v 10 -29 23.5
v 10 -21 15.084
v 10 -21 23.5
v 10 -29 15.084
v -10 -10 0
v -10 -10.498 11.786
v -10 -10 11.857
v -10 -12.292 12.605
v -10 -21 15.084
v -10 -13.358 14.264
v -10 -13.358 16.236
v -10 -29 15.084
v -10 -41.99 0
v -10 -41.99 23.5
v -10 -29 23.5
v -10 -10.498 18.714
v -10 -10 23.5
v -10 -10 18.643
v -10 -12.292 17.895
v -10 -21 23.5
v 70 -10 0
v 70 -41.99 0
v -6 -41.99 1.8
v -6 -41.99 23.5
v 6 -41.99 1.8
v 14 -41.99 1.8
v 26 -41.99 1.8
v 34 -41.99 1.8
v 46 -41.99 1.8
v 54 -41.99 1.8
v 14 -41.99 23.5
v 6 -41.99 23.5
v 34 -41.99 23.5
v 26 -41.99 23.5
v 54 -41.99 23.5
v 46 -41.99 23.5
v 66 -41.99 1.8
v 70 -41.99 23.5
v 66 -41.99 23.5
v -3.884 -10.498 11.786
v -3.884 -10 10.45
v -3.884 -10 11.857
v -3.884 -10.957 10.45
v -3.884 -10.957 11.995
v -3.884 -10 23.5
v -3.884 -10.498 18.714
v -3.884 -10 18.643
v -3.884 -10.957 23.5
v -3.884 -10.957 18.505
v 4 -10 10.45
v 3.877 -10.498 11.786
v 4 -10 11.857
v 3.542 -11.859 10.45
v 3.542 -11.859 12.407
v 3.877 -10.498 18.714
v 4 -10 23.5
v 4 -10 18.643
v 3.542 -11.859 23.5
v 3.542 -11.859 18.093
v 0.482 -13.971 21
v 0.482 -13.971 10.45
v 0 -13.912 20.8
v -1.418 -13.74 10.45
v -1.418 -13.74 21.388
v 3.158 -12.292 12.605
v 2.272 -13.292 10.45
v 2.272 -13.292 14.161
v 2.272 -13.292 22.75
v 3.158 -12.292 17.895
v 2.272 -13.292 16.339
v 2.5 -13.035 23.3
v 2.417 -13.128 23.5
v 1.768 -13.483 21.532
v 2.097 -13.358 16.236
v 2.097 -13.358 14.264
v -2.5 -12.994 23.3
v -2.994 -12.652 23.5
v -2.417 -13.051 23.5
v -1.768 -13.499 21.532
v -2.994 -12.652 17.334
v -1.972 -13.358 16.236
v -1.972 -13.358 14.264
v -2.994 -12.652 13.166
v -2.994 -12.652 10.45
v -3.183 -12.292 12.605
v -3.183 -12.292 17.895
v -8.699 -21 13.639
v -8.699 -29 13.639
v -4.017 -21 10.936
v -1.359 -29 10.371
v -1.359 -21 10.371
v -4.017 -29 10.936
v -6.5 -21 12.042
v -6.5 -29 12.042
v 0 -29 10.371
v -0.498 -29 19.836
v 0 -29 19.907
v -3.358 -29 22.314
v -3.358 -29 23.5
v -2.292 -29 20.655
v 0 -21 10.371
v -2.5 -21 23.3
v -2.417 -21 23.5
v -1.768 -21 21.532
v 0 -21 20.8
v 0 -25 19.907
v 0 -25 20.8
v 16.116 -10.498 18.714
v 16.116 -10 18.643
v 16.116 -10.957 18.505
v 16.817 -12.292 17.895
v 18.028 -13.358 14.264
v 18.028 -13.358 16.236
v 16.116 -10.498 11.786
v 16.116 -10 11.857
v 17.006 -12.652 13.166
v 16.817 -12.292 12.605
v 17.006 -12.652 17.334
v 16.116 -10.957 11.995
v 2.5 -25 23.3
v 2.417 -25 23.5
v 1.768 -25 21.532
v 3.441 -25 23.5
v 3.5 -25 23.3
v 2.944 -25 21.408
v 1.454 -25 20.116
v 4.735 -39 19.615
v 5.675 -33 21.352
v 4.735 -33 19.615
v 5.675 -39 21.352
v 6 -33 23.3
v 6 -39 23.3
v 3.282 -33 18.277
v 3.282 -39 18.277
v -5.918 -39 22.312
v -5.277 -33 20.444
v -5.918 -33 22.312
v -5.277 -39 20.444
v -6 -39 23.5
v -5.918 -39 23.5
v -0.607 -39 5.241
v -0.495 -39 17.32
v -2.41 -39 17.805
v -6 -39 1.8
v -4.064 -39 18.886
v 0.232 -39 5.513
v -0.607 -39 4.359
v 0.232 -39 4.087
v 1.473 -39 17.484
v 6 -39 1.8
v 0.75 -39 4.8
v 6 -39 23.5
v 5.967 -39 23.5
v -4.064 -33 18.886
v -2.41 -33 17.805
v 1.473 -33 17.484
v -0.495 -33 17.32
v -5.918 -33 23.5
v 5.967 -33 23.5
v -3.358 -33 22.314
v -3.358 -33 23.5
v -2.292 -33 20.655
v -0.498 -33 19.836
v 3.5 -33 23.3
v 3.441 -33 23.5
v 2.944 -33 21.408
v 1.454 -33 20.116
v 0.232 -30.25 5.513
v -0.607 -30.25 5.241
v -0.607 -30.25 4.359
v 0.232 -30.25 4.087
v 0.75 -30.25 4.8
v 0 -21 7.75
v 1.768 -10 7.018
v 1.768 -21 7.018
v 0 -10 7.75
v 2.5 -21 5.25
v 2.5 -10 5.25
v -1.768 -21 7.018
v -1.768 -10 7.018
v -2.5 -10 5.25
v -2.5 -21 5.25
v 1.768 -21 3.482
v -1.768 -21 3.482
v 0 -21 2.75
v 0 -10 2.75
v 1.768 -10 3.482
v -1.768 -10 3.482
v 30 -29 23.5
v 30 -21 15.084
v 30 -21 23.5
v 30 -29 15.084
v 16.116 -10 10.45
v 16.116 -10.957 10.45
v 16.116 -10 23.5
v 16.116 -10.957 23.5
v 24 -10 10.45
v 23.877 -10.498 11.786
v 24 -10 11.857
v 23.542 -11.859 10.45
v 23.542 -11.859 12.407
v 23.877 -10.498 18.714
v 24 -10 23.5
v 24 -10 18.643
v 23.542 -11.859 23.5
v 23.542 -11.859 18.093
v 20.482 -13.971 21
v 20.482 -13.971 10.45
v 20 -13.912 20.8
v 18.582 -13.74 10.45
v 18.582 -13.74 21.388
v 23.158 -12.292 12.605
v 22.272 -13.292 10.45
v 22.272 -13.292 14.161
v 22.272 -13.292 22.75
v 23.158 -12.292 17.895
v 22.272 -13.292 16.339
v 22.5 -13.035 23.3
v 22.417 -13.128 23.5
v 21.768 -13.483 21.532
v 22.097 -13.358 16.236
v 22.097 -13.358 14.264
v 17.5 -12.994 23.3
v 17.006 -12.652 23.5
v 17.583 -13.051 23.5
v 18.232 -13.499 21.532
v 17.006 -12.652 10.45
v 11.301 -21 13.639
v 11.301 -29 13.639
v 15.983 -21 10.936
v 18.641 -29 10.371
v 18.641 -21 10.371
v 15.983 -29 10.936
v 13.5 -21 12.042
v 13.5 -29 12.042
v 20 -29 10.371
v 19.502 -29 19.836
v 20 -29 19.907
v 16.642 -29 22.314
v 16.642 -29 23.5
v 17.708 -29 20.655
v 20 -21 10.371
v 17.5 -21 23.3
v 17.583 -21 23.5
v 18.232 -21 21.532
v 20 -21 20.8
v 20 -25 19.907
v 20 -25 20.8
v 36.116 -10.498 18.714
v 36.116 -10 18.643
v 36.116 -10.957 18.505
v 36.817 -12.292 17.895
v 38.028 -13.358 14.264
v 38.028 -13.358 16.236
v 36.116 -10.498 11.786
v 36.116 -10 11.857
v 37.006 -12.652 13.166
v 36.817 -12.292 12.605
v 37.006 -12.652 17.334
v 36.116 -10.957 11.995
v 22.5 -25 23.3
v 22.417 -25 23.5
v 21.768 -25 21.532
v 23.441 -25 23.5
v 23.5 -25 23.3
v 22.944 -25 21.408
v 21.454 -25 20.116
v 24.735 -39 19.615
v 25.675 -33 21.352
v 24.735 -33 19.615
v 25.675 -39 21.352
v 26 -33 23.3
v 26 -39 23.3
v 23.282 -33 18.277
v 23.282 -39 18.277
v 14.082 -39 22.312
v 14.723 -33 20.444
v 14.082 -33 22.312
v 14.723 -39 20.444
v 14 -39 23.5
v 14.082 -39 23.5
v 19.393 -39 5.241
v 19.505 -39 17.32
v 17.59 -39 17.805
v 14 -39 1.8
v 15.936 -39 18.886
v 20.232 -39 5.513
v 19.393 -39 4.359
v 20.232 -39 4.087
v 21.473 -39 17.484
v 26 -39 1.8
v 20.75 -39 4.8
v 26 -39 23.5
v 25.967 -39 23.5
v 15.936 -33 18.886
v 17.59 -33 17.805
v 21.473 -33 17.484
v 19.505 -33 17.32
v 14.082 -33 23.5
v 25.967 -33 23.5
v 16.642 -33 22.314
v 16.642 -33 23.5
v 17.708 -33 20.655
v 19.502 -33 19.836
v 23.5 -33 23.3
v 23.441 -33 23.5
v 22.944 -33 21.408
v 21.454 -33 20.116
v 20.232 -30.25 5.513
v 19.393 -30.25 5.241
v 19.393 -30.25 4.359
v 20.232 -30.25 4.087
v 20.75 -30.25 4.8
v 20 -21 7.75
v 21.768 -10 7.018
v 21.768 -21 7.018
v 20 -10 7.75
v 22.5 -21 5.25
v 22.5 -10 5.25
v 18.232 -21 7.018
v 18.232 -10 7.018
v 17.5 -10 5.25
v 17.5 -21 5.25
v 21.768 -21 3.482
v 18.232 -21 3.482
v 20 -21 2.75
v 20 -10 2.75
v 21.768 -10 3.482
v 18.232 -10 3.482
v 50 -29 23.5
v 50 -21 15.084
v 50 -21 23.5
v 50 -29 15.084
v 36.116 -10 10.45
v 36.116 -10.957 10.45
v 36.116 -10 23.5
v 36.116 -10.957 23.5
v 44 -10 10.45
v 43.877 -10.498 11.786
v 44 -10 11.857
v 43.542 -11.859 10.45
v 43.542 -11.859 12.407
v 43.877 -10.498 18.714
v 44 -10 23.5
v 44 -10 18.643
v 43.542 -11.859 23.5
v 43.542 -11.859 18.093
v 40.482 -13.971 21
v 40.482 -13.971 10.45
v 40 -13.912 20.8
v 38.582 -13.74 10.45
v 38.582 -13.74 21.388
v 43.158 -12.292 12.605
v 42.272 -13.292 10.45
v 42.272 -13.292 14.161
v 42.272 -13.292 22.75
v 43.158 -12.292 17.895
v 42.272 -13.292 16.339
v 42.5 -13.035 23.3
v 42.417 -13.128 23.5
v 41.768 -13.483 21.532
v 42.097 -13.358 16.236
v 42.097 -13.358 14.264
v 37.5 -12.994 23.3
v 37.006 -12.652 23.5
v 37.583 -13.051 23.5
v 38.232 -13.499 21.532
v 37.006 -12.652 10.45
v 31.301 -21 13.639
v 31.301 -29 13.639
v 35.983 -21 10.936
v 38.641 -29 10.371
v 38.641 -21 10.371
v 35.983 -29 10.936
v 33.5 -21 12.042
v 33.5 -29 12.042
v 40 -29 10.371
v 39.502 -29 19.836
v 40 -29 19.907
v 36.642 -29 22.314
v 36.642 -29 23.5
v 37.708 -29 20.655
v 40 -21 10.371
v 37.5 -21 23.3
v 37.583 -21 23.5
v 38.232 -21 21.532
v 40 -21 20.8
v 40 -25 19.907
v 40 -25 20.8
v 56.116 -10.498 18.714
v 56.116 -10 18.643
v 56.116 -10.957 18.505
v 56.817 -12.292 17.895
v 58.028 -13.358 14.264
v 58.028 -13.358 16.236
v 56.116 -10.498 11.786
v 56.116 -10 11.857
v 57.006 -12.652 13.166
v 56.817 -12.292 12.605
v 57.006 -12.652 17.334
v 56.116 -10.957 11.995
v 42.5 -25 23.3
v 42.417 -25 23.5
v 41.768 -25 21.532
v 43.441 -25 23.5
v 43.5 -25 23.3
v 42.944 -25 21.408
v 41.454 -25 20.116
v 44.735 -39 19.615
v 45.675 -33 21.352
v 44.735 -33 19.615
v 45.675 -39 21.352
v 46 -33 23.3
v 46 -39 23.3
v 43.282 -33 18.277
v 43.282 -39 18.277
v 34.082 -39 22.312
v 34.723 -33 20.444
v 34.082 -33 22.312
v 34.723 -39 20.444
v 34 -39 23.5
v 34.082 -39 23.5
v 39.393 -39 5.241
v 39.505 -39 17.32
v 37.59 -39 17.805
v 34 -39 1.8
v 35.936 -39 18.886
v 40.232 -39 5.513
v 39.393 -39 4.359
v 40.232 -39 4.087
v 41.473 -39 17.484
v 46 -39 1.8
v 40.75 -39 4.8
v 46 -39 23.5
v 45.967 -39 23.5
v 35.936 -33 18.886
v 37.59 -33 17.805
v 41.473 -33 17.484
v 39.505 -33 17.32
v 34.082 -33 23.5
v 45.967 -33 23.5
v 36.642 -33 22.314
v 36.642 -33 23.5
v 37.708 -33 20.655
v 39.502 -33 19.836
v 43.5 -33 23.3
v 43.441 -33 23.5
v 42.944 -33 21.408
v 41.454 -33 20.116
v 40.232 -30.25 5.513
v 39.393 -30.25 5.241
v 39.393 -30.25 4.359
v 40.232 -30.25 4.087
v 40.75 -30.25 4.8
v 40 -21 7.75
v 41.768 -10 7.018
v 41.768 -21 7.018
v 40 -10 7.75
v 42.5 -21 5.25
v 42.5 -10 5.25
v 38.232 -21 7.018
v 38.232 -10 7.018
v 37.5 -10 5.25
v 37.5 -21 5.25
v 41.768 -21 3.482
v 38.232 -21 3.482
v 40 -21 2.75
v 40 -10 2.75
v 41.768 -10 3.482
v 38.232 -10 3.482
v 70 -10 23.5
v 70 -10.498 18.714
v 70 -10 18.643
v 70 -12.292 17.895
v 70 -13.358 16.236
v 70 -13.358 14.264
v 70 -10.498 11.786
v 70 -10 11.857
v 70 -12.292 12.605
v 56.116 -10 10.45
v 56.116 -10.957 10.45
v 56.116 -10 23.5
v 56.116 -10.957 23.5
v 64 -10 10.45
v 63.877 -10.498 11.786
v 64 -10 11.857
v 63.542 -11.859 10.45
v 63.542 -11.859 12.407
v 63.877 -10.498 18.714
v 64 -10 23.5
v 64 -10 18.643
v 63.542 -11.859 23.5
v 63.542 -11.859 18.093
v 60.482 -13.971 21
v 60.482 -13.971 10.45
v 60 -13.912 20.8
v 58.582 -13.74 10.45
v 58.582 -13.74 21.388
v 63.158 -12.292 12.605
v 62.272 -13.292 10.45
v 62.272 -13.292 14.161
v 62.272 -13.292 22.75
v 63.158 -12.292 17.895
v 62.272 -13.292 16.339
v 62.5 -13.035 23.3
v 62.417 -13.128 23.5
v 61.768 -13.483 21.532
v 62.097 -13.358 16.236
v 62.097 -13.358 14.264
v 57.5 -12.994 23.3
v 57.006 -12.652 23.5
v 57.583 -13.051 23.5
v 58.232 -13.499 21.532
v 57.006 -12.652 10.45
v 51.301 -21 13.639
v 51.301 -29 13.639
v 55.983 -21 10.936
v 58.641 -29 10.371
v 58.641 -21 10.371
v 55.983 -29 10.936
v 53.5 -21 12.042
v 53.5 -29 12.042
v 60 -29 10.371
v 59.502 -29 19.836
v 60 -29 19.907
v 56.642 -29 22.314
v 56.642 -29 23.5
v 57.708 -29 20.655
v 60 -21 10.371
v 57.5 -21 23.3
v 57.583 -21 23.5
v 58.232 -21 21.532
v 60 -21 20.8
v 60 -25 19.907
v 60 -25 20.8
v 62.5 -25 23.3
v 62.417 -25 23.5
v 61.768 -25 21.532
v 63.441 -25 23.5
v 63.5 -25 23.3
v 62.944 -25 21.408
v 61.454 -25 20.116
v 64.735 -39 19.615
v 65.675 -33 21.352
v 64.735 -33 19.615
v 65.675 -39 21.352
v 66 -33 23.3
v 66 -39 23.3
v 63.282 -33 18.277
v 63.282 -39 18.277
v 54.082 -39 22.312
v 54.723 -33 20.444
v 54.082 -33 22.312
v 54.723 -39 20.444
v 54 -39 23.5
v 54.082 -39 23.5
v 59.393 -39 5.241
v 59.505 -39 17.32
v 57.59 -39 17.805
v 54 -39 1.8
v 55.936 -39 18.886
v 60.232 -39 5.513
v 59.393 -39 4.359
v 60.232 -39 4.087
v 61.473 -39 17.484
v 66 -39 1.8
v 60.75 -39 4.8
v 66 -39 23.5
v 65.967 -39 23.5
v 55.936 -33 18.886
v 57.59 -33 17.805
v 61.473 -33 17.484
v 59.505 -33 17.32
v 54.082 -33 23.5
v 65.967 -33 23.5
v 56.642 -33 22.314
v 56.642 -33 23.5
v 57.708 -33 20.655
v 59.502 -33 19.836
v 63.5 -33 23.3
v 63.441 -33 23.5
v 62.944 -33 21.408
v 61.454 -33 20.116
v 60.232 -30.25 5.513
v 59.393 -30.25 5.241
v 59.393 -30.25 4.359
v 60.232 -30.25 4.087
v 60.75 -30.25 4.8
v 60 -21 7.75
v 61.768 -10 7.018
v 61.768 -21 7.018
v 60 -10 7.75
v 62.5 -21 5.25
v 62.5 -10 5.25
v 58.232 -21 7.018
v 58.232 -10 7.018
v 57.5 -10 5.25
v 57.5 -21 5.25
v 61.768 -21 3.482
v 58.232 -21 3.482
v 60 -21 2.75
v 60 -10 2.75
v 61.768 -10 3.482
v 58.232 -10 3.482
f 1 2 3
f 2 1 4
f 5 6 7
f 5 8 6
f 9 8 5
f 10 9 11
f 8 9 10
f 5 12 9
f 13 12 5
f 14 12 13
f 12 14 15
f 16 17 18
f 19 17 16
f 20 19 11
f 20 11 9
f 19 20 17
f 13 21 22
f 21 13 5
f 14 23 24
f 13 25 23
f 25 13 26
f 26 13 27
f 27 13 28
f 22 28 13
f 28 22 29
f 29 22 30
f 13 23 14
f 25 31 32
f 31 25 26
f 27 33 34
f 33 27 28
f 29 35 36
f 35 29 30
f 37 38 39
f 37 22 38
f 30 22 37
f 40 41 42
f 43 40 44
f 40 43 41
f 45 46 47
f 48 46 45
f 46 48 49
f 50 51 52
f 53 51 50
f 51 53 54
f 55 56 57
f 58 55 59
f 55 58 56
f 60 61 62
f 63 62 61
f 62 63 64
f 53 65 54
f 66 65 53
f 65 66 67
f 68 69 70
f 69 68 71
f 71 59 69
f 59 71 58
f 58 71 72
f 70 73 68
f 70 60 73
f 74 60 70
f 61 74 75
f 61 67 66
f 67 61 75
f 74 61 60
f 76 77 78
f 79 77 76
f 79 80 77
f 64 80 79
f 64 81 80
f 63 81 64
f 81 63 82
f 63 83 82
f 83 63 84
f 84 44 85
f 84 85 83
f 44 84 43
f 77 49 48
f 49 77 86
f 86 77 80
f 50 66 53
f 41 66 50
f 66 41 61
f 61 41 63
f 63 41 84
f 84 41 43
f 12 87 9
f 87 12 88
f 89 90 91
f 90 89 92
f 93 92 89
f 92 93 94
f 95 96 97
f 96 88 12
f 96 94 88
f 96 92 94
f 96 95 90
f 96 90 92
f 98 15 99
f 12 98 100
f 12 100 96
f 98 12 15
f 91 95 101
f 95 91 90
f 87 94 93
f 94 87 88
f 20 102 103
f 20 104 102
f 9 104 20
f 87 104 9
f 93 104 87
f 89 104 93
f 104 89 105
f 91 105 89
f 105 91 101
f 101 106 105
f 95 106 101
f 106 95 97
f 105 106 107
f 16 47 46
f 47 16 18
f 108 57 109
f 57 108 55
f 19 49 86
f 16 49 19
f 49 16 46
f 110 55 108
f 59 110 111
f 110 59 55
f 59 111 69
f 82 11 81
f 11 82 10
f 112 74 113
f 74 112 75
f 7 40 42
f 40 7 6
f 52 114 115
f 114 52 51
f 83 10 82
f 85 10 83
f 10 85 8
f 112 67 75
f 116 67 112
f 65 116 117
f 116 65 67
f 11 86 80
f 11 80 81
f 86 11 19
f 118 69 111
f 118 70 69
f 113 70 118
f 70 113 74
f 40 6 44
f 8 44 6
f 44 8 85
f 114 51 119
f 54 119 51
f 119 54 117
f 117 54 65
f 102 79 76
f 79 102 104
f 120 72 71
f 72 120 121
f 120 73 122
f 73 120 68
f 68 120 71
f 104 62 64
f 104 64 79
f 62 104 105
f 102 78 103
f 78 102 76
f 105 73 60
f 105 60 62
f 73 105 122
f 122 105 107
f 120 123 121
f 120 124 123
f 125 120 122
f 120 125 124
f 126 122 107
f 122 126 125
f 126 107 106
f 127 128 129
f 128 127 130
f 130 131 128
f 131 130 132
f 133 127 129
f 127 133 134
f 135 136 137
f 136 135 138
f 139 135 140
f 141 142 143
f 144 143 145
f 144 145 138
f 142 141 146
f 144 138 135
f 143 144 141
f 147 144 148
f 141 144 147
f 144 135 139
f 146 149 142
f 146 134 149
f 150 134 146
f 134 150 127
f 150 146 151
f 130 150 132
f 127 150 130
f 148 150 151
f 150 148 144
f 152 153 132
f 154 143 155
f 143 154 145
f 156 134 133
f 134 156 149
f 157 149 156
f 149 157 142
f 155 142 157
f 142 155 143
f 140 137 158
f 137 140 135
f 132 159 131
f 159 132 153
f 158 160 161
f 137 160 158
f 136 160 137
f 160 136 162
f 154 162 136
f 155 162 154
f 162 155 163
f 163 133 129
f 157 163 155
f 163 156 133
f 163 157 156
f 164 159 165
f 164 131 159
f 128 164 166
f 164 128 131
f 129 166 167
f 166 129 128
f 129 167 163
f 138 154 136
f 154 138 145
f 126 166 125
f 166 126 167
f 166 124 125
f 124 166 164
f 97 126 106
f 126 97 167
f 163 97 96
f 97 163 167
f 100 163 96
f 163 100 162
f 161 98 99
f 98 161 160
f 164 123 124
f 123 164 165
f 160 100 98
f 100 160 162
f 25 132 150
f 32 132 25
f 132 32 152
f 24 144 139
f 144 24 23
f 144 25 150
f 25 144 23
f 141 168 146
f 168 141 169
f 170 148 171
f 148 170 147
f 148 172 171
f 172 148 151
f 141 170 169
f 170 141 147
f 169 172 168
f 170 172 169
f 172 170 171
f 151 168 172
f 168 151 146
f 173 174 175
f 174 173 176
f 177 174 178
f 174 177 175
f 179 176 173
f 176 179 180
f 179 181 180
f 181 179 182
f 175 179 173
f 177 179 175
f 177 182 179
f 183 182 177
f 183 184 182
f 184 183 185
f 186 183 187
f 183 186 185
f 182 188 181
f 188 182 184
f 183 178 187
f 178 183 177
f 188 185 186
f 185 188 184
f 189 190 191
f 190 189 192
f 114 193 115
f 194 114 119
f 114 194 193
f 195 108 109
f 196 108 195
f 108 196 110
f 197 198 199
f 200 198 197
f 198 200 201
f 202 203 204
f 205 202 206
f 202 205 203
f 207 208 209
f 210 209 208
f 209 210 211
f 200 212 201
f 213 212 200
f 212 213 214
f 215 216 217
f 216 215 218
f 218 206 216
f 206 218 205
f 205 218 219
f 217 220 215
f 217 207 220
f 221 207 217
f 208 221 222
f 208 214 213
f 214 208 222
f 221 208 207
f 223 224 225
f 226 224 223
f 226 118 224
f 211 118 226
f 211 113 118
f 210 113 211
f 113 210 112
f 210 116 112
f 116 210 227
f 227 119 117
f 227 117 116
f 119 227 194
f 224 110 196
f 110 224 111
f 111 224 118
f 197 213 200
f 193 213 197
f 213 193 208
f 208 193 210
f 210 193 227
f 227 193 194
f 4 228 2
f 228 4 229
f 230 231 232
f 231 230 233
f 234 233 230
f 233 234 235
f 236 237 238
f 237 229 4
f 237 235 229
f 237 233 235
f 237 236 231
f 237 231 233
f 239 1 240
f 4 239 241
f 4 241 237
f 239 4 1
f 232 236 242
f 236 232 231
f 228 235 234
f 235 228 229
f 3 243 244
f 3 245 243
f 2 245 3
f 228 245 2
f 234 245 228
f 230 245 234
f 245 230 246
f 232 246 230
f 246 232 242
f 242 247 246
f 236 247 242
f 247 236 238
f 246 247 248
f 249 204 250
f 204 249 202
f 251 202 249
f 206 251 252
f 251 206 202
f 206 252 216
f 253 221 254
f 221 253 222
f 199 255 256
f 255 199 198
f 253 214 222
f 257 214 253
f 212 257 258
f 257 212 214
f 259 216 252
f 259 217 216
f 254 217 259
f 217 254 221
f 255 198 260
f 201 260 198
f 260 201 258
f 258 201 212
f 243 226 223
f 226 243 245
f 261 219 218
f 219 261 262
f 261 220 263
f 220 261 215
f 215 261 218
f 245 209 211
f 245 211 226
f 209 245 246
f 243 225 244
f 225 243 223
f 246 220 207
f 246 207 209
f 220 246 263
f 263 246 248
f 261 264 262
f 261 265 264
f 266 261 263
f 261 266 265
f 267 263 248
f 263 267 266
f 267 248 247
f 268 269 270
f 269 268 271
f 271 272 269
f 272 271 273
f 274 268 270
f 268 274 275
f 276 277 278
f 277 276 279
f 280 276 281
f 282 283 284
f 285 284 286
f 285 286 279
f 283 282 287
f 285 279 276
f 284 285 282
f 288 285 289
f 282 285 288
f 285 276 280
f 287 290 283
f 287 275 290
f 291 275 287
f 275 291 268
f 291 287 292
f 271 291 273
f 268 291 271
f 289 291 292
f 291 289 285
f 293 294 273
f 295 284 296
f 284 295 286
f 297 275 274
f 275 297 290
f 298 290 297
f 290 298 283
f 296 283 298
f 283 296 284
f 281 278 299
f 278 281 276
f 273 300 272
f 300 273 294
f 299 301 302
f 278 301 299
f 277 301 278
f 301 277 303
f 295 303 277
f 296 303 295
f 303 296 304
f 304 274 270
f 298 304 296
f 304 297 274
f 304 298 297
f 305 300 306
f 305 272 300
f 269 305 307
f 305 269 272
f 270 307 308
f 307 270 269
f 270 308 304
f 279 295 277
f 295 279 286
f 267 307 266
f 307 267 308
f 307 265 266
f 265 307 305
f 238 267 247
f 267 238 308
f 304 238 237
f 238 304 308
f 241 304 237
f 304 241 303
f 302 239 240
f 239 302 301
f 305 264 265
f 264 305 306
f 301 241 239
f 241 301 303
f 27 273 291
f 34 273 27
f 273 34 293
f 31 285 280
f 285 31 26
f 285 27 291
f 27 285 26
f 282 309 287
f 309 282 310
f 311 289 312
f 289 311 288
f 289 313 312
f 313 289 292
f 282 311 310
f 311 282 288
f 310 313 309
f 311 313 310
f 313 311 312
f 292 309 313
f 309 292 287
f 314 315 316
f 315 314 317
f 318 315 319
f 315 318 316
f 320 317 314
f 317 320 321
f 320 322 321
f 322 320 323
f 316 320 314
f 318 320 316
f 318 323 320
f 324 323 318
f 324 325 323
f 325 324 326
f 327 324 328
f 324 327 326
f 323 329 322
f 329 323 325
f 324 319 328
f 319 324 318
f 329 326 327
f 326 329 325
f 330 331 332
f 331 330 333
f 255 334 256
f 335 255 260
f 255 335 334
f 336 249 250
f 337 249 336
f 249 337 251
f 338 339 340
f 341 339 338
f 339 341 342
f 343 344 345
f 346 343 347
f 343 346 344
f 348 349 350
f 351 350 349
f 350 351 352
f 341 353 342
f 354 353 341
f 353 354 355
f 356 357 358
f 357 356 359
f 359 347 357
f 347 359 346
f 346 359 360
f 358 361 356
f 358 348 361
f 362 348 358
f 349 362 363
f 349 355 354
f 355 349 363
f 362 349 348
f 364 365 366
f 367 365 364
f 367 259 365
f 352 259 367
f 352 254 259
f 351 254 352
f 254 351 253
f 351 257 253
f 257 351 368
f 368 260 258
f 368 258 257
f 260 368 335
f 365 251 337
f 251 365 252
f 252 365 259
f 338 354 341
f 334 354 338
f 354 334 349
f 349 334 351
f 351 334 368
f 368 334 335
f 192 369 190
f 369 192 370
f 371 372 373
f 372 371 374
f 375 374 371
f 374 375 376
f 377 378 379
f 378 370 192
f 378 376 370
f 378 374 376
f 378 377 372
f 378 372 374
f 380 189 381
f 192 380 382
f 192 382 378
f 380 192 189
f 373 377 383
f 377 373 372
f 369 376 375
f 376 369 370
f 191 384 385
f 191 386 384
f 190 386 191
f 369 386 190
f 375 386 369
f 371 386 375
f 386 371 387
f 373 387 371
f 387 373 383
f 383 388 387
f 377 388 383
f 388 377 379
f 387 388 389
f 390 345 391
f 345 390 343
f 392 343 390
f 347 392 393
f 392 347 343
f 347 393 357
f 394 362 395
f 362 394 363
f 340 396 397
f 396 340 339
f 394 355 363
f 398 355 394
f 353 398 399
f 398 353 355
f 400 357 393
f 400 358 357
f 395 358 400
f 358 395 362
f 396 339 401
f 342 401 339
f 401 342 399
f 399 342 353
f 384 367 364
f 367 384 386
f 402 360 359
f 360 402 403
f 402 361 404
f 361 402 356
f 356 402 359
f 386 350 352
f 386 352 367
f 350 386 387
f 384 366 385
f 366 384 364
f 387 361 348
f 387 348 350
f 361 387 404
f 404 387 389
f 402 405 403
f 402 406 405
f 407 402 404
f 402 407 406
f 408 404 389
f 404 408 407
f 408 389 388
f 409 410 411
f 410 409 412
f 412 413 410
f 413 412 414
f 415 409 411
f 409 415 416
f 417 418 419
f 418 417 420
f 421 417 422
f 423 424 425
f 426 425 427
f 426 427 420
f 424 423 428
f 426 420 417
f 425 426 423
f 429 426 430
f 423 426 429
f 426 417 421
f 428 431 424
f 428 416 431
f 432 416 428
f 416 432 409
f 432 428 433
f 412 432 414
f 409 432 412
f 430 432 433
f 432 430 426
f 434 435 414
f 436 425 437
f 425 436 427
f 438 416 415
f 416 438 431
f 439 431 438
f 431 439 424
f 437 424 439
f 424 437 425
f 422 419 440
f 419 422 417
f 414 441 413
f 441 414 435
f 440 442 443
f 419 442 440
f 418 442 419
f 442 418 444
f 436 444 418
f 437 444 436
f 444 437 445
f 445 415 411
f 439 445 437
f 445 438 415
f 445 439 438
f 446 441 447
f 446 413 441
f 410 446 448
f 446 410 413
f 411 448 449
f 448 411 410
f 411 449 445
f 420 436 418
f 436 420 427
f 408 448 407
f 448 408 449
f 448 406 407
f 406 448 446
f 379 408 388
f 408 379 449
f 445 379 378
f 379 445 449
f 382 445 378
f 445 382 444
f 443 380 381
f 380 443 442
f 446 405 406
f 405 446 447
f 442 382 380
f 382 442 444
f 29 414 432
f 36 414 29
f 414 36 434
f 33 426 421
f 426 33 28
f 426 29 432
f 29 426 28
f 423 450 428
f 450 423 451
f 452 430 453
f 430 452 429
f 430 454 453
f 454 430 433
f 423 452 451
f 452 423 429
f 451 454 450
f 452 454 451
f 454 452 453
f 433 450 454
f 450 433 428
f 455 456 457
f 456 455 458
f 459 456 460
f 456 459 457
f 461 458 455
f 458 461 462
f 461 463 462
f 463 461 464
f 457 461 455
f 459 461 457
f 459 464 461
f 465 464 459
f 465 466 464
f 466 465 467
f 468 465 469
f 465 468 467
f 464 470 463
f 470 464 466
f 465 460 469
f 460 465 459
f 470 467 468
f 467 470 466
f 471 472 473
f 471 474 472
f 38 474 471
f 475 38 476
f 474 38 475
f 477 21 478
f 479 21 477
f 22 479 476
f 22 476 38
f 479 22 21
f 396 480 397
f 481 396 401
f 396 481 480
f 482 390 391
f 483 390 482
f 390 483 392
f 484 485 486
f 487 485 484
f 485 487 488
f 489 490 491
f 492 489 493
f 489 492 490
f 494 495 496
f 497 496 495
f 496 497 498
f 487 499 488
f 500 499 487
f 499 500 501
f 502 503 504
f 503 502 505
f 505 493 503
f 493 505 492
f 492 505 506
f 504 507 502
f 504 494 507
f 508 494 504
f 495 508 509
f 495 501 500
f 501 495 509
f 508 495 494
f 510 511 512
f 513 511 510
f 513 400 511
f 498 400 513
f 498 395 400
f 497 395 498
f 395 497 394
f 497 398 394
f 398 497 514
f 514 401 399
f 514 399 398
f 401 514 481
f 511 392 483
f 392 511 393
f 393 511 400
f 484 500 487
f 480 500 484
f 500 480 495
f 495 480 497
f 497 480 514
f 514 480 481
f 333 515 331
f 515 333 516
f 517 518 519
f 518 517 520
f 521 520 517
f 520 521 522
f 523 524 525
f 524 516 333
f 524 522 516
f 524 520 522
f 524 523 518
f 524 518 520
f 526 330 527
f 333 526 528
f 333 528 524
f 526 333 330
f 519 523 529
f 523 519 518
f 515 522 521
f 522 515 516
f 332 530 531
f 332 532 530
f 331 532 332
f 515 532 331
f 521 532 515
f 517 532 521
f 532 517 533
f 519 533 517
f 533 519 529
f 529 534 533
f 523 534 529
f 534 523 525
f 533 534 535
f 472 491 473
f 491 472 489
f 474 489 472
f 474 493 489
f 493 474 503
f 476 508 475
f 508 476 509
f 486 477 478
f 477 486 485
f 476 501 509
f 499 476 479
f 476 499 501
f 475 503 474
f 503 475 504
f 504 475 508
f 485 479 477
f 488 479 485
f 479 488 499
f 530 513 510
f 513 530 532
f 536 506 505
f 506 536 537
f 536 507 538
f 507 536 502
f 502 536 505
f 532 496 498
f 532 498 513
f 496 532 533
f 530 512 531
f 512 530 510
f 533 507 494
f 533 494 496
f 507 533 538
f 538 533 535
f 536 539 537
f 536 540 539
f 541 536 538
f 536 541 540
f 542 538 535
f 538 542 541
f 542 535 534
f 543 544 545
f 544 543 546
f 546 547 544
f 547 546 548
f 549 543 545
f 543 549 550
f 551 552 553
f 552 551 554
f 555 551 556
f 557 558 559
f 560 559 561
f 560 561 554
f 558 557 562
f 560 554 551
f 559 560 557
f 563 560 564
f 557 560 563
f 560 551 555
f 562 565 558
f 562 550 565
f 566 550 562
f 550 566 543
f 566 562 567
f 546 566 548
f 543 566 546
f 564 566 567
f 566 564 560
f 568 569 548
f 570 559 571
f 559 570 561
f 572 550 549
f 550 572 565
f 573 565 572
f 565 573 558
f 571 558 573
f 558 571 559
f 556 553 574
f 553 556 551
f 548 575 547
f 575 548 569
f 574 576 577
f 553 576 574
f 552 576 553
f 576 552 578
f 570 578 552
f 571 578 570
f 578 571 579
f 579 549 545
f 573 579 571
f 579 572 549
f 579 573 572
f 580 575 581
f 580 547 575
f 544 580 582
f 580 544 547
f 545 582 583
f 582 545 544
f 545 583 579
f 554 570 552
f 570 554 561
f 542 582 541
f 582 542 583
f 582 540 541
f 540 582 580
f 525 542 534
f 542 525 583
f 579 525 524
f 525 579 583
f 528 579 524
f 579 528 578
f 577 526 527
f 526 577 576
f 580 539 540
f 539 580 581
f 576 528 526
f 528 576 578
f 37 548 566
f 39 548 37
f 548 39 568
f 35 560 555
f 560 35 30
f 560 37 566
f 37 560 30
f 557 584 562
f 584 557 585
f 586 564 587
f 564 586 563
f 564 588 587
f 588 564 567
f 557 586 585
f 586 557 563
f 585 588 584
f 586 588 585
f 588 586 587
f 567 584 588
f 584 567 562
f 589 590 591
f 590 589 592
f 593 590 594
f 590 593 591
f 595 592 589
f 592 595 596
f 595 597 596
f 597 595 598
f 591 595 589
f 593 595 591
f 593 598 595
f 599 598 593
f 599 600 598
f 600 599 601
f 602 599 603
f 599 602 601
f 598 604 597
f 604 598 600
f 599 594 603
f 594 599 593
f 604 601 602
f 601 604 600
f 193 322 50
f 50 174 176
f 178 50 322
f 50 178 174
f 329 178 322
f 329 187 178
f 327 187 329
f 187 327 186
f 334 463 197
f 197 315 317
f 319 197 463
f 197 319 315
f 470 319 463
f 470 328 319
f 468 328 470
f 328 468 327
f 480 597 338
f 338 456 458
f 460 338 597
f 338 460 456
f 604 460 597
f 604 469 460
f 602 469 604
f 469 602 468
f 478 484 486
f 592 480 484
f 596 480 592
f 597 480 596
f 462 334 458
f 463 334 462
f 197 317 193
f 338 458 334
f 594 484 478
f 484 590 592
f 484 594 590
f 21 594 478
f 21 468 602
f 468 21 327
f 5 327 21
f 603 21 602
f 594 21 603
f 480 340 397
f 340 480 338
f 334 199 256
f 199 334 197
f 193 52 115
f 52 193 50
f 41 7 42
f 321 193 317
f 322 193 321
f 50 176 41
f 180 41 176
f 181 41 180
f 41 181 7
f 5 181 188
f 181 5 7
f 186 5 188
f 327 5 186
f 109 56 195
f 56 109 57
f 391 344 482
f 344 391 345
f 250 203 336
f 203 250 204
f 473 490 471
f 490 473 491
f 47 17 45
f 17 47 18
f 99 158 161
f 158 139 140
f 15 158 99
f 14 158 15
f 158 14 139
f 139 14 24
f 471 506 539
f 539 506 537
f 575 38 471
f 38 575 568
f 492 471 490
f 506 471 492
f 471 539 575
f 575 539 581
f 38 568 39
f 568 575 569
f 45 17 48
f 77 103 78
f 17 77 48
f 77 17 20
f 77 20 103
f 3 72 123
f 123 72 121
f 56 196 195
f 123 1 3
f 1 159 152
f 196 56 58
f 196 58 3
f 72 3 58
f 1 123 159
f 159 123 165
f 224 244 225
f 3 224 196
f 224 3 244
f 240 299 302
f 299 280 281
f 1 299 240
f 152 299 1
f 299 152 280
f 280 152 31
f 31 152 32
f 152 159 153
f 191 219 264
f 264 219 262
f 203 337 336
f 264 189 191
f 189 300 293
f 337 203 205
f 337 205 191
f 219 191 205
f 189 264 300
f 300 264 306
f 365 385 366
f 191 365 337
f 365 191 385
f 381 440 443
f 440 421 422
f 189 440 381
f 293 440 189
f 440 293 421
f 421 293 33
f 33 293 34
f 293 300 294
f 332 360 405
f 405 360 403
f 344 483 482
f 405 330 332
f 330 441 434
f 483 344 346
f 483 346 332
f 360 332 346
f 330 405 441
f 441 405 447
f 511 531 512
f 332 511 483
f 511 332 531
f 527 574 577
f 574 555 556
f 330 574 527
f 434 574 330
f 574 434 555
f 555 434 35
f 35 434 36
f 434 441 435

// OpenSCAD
// file: ../servo.scad
servo_width = 12;
servo_body_depth = 22.5;
servo_body_height = 22.5;
servo_ear_size = 5;
servo_step_height = 6;
servo_horn_height = 8+servo_step_height;
// servo step diameter is equal to the body width

// We put the center of the object at the center of the output
module g90s() {
    translate([-servo_width / 2, -servo_width / 2, -servo_body_height - servo_horn_height])
    {
        // The main body of the servo
        cube([servo_width, servo_body_depth, servo_body_height]);

        // Ears
        translate([0, -servo_ear_size, servo_body_height - 3])
        cube([servo_width, servo_body_depth + 2*servo_ear_size, 3]);

        // Pegs represent where the screws might go
        translate([servo_width / 2, -2, servo_body_height / 2])
             cylinder(d=1.5, h=20);

        translate([servo_width / 2, servo_body_depth + 2, servo_body_height / 2])
             cylinder(d=1.5, h=20);

        // The output shaft
        translate([servo_width / 2, servo_width / 2, servo_body_height]) {
            cylinder(d=servo_width, h=servo_step_height);
            // This cylinder goes to the top of the horn, with screw
            cylinder(d=7, h=servo_horn_height);
        }
    }
}
// file: ../defs.scad
// Units are mm
tube_dia = 6.3;
led_dia = 11;
led_h = 3;
wire_dia = 3;
led_pad_spacing_x = 2;
led_pad_spacing_y = 4;
// file: water_block.scad
// units are mm
include <../defs.scad>
include <../servo.scad>

F = 0.01;

pipe_spacing = 20;
n_pipe = 4;
base_height = 10;
block_depth = 30;
top_depth = 40;
valve_body_length = 17;
valve_body_hang = 1.3;
valve_body_dia = 8;
body_back_to_stem_t = 10;
stem_dia = 5;
body_back_to_stem_c = body_back_to_stem_t + (stem_dia / 2);
stem_top_to_valve = 11;
stem_height = 23;
stem_center = body_back_to_stem_c - valve_body_hang - tube_dia / 2;
stem_top = stem_top_to_valve + (valve_body_dia) / 2;
handle_rad = 13;
top_side_height = stem_top + servo_horn_height + 3 - F;

module outlet() {
    tube_dia = 7;
    // backplane pipe
    translate([-(pipe_spacing + F) / 2, 0])
    rotate([0, 90, 0])
    cylinder(d = tube_dia, h = pipe_spacing + F);

    translate([0, -valve_body_hang - tube_dia / 2, 0])
    rotate([-90, 0, 0]) {
        // Valve body
        cylinder(d = valve_body_dia, h=valve_body_length);
        // Spacing for the outlet hose
        cylinder(d = 7, h = 30);
    }

    // Valve stem
    translate([0
              , stem_center
              , stem_top - stem_height])
    cylinder(d = stem_dia, h=stem_height);

    // Handle sweep
    intersection() {
        translate([0
                  ,stem_center
                  ,stem_top - 4])
        cylinder(r = handle_rad, 8);

        translate([-50, 0, 0])
        cube([100, 100, 100], true);
    }
}

module outlet_holder() {
    difference() {
        // Base structure
        union() {
            // The foundation
            translate([0, block_depth / 2, base_height / 2])
            cube([pipe_spacing, block_depth, base_height], true);

            // Overhang for the top
            translate([0, top_depth / 2, base_height + (top_side_height) / 2])
            cube([pipe_spacing, top_depth, top_side_height], true);
        }

        #translate([0, 4 + servo_body_depth / 2, base_height]) {
            // Make space for the outlet
            outlet();
            // Make space for the servo
            #
            // Put the output above the valve handle
            translate([0, stem_center, stem_top])
            rotate([0, 180, 180]) // Rotate it into correct orientation
            g90s();

            // Alignment pins
            #translate([0, -10, -9])
            cylinder(d=5, h=20);
        }
    }
}

module all_outlets() {
    union() {
        for (i = [1:n_pipe]) {
            translate([(i-1) * pipe_spacing, 0, 0])
            outlet_holder();
        }
    }
}

module select_segment(segment) {
    intersection() {
         all_outlets();

         if (segment == 1) {
              translate([-pipe_spacing/2, 0, 0])
                   cube([pipe_spacing*n_pipe, 4 + servo_body_depth - 3, base_height]);
         }
         if (segment == 2) {
              translate([-pipe_spacing/2, 0, base_height])
                   cube([pipe_spacing*n_pipe, 4 + servo_body_depth - 3, top_side_height]);
         }
    }
}

all_outlets();
// main file
use <water_block.scad>

rotate([90, 0, 0])
select_segment(2);
